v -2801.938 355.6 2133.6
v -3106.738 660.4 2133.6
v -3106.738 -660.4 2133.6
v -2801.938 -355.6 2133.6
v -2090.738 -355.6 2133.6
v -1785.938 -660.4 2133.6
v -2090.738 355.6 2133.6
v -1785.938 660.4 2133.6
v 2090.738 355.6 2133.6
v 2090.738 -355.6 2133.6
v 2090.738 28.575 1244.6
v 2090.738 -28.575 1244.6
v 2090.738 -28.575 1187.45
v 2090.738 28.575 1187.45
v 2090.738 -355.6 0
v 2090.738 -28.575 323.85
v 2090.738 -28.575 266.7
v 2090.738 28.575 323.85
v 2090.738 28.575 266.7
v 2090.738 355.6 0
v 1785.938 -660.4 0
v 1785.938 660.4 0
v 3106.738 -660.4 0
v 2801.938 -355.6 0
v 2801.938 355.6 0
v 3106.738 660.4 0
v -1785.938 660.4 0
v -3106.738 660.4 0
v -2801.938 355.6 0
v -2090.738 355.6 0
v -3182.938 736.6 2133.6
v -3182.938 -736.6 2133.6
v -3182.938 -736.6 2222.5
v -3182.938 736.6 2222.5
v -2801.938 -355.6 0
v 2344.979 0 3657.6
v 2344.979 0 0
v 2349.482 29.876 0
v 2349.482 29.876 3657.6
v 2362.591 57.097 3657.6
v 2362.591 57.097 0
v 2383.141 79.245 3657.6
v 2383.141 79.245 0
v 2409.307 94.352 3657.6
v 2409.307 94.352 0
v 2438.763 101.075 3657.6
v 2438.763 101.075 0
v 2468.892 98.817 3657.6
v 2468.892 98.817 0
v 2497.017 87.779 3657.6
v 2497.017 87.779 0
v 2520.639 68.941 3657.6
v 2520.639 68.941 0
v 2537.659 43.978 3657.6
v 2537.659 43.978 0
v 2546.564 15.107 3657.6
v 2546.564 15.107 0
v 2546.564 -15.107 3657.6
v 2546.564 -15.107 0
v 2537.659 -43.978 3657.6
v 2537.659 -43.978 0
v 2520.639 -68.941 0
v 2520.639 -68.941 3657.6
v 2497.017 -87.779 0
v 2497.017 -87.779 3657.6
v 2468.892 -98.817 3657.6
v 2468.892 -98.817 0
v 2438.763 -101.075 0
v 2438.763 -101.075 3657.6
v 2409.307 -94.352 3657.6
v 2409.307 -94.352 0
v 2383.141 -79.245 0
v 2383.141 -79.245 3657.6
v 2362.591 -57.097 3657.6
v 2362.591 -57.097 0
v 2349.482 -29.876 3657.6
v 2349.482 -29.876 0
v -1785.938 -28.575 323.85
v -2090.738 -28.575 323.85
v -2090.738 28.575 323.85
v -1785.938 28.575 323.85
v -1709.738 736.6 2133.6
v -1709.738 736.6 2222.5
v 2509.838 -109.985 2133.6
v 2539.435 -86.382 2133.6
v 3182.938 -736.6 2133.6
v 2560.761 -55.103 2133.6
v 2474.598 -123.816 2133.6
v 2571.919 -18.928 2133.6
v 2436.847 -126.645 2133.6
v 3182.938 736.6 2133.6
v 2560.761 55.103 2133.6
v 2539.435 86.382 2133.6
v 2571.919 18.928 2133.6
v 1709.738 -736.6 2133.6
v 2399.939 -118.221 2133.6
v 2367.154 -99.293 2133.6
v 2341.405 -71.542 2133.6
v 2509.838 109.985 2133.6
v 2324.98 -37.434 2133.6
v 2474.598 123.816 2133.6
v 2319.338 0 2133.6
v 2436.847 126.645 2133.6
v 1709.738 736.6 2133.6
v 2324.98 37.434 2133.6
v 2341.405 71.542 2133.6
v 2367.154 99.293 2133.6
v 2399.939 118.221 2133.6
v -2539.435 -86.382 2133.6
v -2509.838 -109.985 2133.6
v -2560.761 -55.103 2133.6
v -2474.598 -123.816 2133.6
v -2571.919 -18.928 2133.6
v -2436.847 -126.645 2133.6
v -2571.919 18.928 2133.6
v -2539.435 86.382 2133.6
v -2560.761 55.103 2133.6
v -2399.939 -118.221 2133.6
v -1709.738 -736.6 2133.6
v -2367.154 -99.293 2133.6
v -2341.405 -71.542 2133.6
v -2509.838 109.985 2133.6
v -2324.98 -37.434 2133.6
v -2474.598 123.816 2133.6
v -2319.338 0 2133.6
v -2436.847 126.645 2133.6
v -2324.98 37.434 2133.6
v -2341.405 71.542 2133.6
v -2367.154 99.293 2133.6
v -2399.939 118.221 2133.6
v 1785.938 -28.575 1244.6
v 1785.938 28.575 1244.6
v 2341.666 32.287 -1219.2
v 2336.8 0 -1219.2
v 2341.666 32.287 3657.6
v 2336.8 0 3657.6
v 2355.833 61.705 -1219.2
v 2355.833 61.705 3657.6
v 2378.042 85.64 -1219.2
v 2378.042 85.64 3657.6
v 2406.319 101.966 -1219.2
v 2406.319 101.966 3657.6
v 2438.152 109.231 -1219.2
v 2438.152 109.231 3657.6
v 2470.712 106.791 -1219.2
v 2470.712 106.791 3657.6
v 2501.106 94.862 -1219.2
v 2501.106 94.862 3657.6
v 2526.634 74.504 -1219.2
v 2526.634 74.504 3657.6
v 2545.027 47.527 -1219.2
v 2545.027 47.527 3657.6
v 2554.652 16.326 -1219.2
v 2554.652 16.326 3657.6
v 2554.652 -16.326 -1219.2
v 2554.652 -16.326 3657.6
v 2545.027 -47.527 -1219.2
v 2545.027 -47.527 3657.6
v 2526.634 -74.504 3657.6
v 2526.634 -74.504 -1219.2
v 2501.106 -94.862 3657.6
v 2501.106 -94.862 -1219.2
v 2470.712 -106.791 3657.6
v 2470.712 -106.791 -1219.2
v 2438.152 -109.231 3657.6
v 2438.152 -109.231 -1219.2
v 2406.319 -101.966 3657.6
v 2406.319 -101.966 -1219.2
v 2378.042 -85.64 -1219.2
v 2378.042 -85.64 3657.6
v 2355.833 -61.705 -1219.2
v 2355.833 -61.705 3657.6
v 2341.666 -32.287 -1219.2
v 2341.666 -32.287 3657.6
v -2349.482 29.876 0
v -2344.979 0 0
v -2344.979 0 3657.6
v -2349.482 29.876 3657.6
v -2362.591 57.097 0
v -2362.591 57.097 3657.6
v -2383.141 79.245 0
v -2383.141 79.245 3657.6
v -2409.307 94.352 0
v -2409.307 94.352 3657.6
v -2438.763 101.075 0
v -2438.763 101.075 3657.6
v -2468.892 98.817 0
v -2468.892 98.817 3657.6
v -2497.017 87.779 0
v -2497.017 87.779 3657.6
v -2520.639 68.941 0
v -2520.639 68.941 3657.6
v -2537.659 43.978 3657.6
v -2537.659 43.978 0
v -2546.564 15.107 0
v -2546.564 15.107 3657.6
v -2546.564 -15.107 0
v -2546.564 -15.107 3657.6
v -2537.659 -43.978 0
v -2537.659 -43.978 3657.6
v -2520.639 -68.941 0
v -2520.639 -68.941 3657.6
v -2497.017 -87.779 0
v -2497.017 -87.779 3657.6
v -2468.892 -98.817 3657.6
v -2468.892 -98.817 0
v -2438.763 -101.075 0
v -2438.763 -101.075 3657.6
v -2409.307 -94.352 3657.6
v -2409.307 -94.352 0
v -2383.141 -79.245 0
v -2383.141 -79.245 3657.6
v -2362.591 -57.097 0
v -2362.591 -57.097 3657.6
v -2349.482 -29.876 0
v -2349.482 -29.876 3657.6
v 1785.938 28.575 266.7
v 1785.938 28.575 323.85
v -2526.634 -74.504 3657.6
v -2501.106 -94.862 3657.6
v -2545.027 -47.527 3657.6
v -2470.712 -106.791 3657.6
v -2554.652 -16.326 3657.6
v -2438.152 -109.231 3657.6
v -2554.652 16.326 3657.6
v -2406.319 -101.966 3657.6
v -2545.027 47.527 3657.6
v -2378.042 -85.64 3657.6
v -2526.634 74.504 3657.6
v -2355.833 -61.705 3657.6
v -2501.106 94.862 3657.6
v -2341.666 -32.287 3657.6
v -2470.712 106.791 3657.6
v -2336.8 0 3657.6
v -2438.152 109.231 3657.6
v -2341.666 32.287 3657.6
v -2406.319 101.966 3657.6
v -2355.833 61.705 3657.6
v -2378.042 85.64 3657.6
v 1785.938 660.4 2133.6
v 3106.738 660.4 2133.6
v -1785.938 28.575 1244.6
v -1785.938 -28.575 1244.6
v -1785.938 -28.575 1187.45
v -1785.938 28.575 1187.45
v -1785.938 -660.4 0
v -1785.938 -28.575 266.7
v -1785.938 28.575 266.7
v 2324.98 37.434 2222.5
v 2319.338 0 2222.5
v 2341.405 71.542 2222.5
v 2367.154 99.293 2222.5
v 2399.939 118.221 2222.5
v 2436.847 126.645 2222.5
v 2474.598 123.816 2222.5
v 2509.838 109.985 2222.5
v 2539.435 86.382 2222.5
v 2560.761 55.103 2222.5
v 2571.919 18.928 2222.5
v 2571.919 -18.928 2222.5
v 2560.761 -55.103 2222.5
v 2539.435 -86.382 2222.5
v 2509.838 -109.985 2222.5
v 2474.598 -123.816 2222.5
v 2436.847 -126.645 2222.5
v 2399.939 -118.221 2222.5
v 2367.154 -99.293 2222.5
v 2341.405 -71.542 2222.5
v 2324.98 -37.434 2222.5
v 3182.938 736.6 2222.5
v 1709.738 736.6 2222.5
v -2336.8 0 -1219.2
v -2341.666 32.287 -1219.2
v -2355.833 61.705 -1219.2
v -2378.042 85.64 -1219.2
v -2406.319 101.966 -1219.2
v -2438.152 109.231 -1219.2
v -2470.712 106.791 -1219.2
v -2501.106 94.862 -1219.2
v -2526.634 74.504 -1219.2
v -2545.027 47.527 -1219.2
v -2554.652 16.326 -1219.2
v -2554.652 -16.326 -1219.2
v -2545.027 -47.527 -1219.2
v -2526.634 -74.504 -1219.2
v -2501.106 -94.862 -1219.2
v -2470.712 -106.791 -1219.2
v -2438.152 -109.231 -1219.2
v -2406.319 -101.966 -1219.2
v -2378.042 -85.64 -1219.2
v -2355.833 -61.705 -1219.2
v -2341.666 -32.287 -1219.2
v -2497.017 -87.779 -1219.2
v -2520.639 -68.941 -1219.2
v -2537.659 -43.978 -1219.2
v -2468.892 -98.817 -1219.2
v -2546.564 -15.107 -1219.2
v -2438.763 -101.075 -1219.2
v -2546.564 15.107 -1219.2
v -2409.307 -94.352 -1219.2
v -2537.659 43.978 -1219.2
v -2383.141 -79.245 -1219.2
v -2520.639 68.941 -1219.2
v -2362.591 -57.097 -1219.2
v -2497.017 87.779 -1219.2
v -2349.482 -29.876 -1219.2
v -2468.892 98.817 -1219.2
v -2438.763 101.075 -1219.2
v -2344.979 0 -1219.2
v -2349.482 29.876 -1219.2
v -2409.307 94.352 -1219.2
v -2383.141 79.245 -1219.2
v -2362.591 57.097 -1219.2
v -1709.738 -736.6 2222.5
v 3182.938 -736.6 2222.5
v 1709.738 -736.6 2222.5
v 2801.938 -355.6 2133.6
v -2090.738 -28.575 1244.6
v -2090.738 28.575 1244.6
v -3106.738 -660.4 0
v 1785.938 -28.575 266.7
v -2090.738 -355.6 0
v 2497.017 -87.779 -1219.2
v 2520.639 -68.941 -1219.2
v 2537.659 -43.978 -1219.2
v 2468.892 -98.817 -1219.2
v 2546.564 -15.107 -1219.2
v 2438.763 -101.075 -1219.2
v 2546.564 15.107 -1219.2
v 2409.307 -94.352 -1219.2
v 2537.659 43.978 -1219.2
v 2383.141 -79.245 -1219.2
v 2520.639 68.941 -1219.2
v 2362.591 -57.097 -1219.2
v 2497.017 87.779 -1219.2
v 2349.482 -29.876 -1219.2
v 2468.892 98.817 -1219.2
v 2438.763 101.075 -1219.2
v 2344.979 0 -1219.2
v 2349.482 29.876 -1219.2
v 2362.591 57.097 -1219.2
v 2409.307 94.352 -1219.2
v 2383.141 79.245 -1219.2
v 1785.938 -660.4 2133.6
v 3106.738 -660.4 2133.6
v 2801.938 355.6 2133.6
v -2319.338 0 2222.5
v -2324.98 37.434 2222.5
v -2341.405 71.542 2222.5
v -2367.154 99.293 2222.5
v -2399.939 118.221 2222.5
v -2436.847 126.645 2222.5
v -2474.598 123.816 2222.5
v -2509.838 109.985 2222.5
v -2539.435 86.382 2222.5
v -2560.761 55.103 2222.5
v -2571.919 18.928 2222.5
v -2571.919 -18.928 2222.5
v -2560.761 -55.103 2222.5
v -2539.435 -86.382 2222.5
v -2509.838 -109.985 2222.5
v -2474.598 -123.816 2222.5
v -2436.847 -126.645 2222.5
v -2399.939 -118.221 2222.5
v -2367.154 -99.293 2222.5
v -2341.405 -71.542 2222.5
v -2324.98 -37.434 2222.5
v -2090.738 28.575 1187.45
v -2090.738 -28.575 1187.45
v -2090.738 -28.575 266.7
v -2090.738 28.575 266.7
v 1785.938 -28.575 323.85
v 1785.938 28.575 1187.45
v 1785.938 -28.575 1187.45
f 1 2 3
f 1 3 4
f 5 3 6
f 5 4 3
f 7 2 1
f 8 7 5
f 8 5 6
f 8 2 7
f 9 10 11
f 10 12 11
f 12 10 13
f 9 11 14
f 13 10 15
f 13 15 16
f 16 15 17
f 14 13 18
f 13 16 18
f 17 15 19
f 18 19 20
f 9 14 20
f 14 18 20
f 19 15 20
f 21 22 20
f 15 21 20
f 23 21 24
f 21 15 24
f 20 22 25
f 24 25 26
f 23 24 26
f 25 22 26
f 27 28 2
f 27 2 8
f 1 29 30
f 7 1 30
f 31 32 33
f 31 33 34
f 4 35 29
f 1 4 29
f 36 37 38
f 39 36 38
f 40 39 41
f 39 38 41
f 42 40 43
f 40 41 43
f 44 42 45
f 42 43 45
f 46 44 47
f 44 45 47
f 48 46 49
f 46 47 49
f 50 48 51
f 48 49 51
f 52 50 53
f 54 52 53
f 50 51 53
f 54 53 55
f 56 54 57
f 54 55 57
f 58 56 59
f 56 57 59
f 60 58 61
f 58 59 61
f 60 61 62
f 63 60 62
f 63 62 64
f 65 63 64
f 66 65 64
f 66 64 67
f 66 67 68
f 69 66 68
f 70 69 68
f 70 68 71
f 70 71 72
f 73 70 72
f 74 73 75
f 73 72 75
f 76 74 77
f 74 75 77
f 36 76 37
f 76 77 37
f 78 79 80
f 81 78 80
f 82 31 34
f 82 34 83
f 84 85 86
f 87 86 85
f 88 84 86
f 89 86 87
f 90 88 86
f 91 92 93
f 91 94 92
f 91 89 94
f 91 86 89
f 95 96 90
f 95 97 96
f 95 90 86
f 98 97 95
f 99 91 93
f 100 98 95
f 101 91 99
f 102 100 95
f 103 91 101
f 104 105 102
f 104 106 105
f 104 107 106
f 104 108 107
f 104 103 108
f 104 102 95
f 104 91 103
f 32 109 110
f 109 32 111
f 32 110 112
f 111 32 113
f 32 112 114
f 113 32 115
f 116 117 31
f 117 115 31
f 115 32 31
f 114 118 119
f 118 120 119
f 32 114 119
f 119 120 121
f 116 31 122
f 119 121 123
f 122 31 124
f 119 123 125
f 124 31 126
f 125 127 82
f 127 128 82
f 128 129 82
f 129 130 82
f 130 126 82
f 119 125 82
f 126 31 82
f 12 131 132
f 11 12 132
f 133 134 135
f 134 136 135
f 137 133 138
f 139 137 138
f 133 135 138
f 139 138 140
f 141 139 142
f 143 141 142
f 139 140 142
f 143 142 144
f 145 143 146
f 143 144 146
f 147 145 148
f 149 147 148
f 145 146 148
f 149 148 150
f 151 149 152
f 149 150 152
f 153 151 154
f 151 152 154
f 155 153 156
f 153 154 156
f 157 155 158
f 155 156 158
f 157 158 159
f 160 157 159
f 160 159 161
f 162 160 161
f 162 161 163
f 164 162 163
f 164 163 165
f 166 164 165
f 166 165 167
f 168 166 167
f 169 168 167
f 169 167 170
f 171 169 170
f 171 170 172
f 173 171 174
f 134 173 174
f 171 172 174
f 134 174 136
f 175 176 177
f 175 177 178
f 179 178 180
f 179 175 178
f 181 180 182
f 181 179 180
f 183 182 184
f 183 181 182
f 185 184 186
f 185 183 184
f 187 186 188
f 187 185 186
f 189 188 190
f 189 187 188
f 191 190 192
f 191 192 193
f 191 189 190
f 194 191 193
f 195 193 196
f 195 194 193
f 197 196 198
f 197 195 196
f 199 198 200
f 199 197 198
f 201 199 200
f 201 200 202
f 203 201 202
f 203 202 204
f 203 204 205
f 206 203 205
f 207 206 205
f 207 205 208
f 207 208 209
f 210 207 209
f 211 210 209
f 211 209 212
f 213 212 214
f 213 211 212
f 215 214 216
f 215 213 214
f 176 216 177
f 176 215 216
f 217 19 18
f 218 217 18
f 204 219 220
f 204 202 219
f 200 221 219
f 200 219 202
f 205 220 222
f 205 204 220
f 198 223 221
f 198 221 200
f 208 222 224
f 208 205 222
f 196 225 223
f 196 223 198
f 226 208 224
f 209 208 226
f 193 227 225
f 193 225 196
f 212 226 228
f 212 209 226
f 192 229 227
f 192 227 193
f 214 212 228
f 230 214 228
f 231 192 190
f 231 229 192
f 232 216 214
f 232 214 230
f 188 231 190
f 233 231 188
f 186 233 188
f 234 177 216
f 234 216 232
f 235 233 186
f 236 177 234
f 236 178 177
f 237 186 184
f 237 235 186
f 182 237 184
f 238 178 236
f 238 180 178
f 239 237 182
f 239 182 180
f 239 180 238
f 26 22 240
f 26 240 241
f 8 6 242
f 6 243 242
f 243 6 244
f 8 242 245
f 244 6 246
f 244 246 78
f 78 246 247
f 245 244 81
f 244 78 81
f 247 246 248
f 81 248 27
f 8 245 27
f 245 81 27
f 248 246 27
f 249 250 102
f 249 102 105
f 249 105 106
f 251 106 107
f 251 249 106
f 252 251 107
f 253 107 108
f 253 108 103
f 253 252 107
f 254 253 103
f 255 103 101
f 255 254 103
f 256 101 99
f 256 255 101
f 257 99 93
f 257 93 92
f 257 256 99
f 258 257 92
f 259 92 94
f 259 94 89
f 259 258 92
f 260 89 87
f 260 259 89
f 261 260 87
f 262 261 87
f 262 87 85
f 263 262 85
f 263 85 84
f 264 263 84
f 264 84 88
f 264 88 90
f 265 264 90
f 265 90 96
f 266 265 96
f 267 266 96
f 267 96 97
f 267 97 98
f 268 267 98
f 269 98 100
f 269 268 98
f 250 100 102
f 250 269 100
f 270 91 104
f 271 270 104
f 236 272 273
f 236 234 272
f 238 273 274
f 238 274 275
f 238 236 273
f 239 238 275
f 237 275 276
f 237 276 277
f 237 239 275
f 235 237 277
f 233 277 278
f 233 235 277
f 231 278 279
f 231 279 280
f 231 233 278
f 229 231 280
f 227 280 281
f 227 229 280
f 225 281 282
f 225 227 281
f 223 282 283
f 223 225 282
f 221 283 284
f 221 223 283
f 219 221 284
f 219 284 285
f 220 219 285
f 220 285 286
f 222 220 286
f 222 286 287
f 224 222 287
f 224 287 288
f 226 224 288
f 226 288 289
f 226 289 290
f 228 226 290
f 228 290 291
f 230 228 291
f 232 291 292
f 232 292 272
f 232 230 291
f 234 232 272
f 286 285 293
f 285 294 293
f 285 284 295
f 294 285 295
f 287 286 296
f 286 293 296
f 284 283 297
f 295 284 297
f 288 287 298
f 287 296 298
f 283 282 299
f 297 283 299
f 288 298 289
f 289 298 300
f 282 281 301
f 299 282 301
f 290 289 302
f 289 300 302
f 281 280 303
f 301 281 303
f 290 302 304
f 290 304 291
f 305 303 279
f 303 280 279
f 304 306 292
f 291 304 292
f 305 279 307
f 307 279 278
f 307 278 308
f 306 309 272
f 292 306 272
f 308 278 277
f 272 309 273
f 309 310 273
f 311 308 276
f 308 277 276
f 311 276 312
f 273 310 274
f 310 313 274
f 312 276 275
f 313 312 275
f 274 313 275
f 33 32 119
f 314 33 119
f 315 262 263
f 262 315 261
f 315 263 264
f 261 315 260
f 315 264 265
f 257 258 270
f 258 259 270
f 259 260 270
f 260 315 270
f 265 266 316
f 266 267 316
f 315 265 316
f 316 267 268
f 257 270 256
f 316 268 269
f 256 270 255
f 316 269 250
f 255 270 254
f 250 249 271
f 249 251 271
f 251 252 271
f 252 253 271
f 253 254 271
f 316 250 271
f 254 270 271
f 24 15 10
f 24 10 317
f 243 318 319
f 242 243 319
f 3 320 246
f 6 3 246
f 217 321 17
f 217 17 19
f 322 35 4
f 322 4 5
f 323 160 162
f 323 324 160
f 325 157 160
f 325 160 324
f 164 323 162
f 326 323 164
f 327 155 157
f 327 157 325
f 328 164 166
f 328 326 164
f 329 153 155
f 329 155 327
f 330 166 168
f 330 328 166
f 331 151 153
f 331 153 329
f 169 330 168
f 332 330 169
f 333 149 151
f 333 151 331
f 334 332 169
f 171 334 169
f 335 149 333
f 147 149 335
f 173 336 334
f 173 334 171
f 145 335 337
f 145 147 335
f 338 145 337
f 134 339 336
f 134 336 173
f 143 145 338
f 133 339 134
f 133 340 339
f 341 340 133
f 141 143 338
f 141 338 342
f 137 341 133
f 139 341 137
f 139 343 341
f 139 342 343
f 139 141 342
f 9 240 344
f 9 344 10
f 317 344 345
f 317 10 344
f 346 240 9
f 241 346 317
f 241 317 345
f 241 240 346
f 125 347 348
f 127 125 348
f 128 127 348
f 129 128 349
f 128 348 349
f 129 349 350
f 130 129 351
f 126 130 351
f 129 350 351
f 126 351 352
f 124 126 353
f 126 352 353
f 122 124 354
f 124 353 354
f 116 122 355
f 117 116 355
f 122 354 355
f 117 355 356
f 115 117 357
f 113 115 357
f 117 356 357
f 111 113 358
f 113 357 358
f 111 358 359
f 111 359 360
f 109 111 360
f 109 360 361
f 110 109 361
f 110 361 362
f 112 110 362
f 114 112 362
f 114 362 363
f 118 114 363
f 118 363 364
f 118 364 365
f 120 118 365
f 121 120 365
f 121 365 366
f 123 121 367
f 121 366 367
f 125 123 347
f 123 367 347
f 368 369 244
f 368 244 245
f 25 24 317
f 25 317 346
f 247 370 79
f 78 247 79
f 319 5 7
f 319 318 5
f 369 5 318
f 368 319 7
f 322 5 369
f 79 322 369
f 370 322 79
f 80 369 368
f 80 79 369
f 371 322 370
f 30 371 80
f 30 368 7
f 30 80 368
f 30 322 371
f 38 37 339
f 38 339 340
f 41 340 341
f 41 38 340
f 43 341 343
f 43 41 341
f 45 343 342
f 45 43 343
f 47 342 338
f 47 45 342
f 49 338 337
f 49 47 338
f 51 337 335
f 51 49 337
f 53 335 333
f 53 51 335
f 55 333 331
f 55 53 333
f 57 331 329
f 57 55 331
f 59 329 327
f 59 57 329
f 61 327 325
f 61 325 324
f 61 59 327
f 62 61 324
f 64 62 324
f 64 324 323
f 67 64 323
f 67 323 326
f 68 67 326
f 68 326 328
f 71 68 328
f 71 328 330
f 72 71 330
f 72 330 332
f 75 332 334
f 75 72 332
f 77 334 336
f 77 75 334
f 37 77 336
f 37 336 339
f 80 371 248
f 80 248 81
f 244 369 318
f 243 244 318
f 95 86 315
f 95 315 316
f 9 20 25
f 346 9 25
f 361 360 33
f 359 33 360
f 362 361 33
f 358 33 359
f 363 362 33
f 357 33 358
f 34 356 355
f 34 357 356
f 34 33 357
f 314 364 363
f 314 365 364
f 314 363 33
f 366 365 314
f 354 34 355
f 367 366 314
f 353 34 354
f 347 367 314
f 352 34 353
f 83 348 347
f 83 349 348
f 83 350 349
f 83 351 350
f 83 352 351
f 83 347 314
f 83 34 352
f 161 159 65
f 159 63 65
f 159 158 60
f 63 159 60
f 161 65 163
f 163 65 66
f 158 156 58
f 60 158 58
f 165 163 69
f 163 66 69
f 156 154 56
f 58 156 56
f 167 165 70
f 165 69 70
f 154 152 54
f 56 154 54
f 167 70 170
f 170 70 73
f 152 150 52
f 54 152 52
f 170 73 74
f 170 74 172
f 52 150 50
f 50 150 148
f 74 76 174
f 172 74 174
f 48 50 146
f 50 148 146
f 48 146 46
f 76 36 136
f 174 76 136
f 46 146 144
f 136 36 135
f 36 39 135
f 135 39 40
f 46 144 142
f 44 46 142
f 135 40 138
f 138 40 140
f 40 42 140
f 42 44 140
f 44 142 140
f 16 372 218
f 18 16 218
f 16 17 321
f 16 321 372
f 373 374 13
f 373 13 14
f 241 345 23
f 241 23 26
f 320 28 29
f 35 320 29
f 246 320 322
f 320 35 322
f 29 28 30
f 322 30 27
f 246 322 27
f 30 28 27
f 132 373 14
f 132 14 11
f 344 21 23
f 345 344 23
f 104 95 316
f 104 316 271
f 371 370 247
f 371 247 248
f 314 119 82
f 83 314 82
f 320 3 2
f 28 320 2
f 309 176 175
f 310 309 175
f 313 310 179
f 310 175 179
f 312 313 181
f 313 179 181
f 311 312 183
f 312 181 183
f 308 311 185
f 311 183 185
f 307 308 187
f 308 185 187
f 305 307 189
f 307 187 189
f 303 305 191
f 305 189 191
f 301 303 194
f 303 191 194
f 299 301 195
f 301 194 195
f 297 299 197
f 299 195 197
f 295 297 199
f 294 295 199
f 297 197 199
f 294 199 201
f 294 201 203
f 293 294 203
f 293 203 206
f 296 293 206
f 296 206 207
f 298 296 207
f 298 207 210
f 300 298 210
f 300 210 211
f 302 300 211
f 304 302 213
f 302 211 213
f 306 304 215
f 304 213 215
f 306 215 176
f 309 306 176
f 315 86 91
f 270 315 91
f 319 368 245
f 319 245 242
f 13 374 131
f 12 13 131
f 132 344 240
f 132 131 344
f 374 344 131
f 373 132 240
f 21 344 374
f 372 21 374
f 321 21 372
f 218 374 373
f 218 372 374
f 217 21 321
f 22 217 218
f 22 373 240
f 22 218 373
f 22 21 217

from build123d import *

# Parameters (mm, degrees)
F0_W           = 1320.8
F0_H           = 1320.8
F0_W_2         = 711.2
F0_H_2         = 711.2
F1_DEPTH       = 2133.6
F2_W           = 1473.2
F2_H           = 1473.2
F3_DEPTH       = 88.9
F4_R           = 127
F5_DEPTH       = 88.9
F7_W           = 57.15
F7_H           = 57.15
F8_DEPTH       = 2090.7375
F8_DEPTH_BACK  = 2090.7375
F9_R           = 109.5375
F9_R_2         = 101.3587
F10_DEPTH      = 3657.6
F10_DEPTH_BACK = 1219.2


with BuildPart() as f1:
    # F0 (on Top) → F1 (new body)
    with BuildSketch(Plane.XY):
        with Locations((-2446.3375, 0)):
            Rectangle(F0_W, F0_H)
        with Locations((-2446.3375, 0)):
            Rectangle(F0_W_2, F0_H_2, mode=Mode.SUBTRACT)
    extrude(amount=F1_DEPTH)


with BuildPart() as f1b:
    # F0 (on Top) → F1, piece 2 (new body)
    with BuildSketch(Plane.XY):
        with Locations((2446.3375, 0)):
            Rectangle(F0_W, F0_H)
        with Locations((2446.3375, 0)):
            Rectangle(F0_W_2, F0_H_2, mode=Mode.SUBTRACT)
    extrude(amount=F1_DEPTH)


with BuildPart() as f3:
    # F2 (on face) → F3 (new body)
    with BuildSketch(Plane.XY.offset(2133.6)):
        with Locations((-2446.3375, 0)):
            Rectangle(F2_W, F2_H)
    extrude(amount=F3_DEPTH)

    # F4 (on face) → F5 (cut, through all)
    with BuildSketch(Plane.XY.offset(2222.5)):
        with Locations((-2446.3375, 0)):
            Circle(F4_R)
    extrude(amount=-F5_DEPTH, mode=Mode.SUBTRACT)


with BuildPart() as f6_1:
    # F6: instance of F3
    add(f3.part.mirror(Plane.YZ))


with BuildPart() as f8_tool:
    # F7 (on Right) → F8 (new body, two sides)
    with BuildSketch(Plane.YZ) as f8_sk:
        with Locations((0, 295.275)):
            Rectangle(F7_W, F7_H)
        with Locations((0, 1216.025)):
            Rectangle(F7_W, F7_H)
    extrude(amount=-F8_DEPTH)
    extrude(f8_sk.sketch, amount=F8_DEPTH_BACK)


with BuildPart() as f1_1:
    add(f1.part)

    # F8: cut by f8_tool
    add(f8_tool.part, mode=Mode.SUBTRACT)


with BuildPart() as f1b_1:
    add(f1b.part)

    # F8: cut by f8_tool
    add(f8_tool.part, mode=Mode.SUBTRACT)


with BuildPart() as f10:
    # F9 (on Top) → F10 (new body, two sides)
    with BuildSketch(Plane.XY) as f10_sk:
        with Locations((-2446.3375, 0)):
            Circle(F9_R)
        with Locations((-2446.3375, 0)):
            Circle(F9_R_2, mode=Mode.SUBTRACT)
    extrude(amount=F10_DEPTH)
    extrude(f10_sk.sketch, amount=-F10_DEPTH_BACK)


with BuildPart() as f11_1:
    # F11: instance of F10
    add(f10.part.mirror(Plane.YZ))


solid = Compound([f3.part, f6_1.part, f1_1.part, f1b_1.part, f10.part, f11_1.part])
